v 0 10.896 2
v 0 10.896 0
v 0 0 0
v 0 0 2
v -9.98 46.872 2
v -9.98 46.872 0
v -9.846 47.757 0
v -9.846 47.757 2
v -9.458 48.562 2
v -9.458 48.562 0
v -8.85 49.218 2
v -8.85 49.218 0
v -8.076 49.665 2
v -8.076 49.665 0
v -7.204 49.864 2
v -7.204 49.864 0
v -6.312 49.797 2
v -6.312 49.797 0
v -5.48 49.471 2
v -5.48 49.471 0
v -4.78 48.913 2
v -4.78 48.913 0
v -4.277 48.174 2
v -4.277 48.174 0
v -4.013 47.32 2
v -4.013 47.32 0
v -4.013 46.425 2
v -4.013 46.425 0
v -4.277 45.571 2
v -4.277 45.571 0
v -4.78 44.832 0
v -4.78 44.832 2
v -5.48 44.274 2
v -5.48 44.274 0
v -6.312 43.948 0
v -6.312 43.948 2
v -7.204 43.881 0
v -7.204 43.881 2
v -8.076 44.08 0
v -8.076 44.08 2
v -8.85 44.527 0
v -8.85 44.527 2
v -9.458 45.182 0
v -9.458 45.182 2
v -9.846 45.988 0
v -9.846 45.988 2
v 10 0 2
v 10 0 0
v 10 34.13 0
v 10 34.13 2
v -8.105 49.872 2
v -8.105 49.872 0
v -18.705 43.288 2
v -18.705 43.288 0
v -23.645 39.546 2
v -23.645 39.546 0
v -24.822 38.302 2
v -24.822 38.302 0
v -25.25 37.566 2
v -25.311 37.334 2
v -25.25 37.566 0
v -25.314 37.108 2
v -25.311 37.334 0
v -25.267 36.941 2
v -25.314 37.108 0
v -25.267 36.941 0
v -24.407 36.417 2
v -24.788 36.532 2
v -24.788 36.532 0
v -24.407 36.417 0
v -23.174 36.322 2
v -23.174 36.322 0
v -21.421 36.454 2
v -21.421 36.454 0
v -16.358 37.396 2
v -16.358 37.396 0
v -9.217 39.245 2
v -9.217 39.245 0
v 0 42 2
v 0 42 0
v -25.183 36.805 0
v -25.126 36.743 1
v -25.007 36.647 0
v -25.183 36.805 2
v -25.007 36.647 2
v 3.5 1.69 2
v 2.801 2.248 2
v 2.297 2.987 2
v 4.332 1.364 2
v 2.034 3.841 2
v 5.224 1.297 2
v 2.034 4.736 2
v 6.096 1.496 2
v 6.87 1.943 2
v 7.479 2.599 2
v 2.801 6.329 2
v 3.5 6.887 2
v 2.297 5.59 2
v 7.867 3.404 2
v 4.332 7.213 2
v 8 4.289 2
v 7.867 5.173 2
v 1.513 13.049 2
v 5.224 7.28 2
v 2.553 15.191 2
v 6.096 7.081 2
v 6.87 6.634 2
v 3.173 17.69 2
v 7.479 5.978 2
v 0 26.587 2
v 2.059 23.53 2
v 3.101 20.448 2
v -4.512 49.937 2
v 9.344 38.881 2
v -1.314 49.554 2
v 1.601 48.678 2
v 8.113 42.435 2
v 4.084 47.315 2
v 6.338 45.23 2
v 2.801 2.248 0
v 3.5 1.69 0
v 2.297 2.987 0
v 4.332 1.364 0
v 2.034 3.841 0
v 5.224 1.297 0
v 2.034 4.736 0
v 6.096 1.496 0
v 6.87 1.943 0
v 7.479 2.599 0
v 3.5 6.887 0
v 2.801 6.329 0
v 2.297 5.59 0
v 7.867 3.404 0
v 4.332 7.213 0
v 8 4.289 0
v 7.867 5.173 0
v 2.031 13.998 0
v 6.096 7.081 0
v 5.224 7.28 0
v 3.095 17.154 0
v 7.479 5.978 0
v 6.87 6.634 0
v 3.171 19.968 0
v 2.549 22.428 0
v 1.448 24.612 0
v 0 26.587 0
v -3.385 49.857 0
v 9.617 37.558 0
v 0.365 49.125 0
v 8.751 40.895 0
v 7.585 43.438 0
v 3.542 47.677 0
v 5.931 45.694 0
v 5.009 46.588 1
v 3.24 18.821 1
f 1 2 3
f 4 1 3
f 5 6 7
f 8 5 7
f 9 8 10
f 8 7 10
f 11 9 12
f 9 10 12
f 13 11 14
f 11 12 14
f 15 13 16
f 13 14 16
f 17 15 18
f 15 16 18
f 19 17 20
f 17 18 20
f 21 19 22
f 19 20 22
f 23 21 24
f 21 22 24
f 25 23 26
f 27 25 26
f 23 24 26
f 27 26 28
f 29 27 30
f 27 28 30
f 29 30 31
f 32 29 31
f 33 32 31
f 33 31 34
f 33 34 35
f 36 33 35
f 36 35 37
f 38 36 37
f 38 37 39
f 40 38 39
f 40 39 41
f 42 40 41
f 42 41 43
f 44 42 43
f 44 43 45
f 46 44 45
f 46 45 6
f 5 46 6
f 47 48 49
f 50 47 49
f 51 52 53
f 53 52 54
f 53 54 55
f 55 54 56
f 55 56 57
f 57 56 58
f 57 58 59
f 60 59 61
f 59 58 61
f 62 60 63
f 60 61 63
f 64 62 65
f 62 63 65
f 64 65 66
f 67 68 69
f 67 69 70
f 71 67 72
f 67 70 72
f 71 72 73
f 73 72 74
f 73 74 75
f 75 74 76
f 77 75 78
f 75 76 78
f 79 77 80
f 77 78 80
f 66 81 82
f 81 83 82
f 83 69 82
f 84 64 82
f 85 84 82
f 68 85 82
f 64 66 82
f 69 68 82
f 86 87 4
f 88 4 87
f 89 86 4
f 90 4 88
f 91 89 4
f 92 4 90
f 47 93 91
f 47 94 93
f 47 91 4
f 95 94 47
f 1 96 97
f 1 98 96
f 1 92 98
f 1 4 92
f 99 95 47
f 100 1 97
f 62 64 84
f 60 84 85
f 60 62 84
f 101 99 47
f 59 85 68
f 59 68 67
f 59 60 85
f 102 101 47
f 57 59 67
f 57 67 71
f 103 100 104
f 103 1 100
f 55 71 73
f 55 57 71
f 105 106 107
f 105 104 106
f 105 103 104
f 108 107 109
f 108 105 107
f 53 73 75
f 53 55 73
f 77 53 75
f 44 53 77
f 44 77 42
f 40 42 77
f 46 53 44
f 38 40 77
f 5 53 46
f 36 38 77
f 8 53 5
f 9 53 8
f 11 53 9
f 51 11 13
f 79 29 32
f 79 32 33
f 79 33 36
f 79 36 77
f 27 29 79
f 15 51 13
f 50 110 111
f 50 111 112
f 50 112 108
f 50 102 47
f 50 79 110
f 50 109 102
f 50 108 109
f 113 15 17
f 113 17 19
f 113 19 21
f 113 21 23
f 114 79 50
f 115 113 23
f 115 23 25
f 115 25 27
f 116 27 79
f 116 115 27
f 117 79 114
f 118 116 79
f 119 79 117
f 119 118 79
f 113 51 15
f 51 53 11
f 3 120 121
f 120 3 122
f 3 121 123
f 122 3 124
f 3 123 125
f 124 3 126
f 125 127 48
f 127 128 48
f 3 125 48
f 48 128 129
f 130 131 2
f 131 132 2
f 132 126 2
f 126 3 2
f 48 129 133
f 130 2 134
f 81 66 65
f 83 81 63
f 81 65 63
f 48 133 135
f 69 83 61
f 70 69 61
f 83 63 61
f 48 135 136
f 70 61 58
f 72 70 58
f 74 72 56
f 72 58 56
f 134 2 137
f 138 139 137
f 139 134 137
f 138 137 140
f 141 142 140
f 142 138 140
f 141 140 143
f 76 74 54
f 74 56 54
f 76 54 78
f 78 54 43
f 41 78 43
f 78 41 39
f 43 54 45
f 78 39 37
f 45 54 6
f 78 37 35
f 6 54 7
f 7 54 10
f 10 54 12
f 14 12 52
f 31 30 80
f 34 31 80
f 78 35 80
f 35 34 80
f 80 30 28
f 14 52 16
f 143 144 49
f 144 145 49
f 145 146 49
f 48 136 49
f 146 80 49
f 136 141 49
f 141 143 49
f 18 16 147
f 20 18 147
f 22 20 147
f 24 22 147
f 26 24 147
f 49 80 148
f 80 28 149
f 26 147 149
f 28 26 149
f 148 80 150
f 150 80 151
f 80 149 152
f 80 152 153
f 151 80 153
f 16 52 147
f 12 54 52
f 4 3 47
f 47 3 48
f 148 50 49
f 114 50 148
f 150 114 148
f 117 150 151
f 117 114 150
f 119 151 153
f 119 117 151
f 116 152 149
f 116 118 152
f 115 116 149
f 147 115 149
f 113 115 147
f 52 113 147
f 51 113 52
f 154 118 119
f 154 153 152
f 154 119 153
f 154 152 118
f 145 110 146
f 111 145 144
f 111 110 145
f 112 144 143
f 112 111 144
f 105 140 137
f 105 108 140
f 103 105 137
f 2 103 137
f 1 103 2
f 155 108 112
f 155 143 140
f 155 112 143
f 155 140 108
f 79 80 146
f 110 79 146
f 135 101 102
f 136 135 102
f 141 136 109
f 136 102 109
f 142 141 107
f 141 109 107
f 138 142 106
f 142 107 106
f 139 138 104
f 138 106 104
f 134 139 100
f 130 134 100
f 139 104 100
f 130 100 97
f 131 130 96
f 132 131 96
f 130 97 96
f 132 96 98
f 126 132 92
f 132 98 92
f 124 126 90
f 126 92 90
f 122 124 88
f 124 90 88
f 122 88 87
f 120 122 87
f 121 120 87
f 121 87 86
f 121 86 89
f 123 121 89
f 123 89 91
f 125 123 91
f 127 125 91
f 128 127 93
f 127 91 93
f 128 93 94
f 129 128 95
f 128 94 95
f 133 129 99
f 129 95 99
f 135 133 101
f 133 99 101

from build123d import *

# Parameters (mm, degrees)
BOSS_EXTRU_1_DEPTH      = 2
ESQUISSE2_R             = 3
ENL_V_MAT_EXTRU_1_DEPTH = 2
ENL_V_MAT_EXTRU_2_DEPTH = 10
ENL_V_MAT_EXTRU_3_DEPTH = 10
ESQUISSE5_R             = 3
ENL_V_MAT_EXTRU_4_DEPTH = 10


with BuildPart() as part:
    # Esquisse1 → Boss.-Extru.1 (new body)
    with BuildSketch(Plane.XY):
        with BuildLine():
            Line((0, 0), (10, 0))
            Line((10, 0), (10, 18))
            Line((10, 18), (10, 60))
            add(Edge.make_bspline(
                [(10, 60), (-55.226480478, 24.725568105), (0, 42)],
                knots=[0, 0, 0, 1, 1, 1], degree=2))
            Line((0, 42), (0, 0))
        make_face()
    extrude(amount=BOSS_EXTRU_1_DEPTH)

    # Esquisse2 → Enlèv. mat.-Extru.1 (cut)
    with BuildSketch(Plane.XY.offset(2)):
        with Locations((5, 4.288504874)):
            Circle(ESQUISSE2_R)
    extrude(amount=-ENL_V_MAT_EXTRU_1_DEPTH, mode=Mode.SUBTRACT)

    # Esquisse3 → Enlèv. mat.-Extru.2 (cut)
    with BuildSketch(Plane.XY.offset(2)):
        with BuildLine():
            Line((0, 26.586944004), (0, 10.895604928))
            add(Edge.make_bspline(
                [(0, 26.586944004), (6.480930753, 18.900406898), (0, 10.895604928)],
                knots=[0, 0, 0, 1, 1, 1], degree=2))
        make_face()
    extrude(amount=-ENL_V_MAT_EXTRU_2_DEPTH, mode=Mode.SUBTRACT)

    # Esquisse4 → Enlèv. mat.-Extru.3 (cut)
    with BuildSketch(Plane.XY.offset(2)):
        with BuildLine():
            Line((10, 34.129750272), (10, 60))
            add(Edge.make_bspline(
                [(10, 60), (-0.661573878, 54.234228815), (-8.10495368, 49.872428448)],
                knots=[0, 0, 0, 1, 1, 1], degree=2))
            add(Edge.make_bspline(
                [(10, 34.129750272), (9.070365691, 51.175646323), (-8.10495368, 49.872428448)],
                knots=[0, 0, 0, 1, 1, 1], degree=2))
        make_face()
    extrude(amount=-ENL_V_MAT_EXTRU_3_DEPTH, mode=Mode.SUBTRACT)

    # Esquisse5 → Enlèv. mat.-Extru.4 (cut)
    with BuildSketch(Plane(origin=(0, 0, 0), x_dir=(-1, 0, 0), z_dir=(0, 0, -1))):
        with Locations((6.979598084, 46.87242842)):
            Circle(ESQUISSE5_R)
    extrude(amount=-ENL_V_MAT_EXTRU_4_DEPTH, mode=Mode.SUBTRACT)


solid = part.part
